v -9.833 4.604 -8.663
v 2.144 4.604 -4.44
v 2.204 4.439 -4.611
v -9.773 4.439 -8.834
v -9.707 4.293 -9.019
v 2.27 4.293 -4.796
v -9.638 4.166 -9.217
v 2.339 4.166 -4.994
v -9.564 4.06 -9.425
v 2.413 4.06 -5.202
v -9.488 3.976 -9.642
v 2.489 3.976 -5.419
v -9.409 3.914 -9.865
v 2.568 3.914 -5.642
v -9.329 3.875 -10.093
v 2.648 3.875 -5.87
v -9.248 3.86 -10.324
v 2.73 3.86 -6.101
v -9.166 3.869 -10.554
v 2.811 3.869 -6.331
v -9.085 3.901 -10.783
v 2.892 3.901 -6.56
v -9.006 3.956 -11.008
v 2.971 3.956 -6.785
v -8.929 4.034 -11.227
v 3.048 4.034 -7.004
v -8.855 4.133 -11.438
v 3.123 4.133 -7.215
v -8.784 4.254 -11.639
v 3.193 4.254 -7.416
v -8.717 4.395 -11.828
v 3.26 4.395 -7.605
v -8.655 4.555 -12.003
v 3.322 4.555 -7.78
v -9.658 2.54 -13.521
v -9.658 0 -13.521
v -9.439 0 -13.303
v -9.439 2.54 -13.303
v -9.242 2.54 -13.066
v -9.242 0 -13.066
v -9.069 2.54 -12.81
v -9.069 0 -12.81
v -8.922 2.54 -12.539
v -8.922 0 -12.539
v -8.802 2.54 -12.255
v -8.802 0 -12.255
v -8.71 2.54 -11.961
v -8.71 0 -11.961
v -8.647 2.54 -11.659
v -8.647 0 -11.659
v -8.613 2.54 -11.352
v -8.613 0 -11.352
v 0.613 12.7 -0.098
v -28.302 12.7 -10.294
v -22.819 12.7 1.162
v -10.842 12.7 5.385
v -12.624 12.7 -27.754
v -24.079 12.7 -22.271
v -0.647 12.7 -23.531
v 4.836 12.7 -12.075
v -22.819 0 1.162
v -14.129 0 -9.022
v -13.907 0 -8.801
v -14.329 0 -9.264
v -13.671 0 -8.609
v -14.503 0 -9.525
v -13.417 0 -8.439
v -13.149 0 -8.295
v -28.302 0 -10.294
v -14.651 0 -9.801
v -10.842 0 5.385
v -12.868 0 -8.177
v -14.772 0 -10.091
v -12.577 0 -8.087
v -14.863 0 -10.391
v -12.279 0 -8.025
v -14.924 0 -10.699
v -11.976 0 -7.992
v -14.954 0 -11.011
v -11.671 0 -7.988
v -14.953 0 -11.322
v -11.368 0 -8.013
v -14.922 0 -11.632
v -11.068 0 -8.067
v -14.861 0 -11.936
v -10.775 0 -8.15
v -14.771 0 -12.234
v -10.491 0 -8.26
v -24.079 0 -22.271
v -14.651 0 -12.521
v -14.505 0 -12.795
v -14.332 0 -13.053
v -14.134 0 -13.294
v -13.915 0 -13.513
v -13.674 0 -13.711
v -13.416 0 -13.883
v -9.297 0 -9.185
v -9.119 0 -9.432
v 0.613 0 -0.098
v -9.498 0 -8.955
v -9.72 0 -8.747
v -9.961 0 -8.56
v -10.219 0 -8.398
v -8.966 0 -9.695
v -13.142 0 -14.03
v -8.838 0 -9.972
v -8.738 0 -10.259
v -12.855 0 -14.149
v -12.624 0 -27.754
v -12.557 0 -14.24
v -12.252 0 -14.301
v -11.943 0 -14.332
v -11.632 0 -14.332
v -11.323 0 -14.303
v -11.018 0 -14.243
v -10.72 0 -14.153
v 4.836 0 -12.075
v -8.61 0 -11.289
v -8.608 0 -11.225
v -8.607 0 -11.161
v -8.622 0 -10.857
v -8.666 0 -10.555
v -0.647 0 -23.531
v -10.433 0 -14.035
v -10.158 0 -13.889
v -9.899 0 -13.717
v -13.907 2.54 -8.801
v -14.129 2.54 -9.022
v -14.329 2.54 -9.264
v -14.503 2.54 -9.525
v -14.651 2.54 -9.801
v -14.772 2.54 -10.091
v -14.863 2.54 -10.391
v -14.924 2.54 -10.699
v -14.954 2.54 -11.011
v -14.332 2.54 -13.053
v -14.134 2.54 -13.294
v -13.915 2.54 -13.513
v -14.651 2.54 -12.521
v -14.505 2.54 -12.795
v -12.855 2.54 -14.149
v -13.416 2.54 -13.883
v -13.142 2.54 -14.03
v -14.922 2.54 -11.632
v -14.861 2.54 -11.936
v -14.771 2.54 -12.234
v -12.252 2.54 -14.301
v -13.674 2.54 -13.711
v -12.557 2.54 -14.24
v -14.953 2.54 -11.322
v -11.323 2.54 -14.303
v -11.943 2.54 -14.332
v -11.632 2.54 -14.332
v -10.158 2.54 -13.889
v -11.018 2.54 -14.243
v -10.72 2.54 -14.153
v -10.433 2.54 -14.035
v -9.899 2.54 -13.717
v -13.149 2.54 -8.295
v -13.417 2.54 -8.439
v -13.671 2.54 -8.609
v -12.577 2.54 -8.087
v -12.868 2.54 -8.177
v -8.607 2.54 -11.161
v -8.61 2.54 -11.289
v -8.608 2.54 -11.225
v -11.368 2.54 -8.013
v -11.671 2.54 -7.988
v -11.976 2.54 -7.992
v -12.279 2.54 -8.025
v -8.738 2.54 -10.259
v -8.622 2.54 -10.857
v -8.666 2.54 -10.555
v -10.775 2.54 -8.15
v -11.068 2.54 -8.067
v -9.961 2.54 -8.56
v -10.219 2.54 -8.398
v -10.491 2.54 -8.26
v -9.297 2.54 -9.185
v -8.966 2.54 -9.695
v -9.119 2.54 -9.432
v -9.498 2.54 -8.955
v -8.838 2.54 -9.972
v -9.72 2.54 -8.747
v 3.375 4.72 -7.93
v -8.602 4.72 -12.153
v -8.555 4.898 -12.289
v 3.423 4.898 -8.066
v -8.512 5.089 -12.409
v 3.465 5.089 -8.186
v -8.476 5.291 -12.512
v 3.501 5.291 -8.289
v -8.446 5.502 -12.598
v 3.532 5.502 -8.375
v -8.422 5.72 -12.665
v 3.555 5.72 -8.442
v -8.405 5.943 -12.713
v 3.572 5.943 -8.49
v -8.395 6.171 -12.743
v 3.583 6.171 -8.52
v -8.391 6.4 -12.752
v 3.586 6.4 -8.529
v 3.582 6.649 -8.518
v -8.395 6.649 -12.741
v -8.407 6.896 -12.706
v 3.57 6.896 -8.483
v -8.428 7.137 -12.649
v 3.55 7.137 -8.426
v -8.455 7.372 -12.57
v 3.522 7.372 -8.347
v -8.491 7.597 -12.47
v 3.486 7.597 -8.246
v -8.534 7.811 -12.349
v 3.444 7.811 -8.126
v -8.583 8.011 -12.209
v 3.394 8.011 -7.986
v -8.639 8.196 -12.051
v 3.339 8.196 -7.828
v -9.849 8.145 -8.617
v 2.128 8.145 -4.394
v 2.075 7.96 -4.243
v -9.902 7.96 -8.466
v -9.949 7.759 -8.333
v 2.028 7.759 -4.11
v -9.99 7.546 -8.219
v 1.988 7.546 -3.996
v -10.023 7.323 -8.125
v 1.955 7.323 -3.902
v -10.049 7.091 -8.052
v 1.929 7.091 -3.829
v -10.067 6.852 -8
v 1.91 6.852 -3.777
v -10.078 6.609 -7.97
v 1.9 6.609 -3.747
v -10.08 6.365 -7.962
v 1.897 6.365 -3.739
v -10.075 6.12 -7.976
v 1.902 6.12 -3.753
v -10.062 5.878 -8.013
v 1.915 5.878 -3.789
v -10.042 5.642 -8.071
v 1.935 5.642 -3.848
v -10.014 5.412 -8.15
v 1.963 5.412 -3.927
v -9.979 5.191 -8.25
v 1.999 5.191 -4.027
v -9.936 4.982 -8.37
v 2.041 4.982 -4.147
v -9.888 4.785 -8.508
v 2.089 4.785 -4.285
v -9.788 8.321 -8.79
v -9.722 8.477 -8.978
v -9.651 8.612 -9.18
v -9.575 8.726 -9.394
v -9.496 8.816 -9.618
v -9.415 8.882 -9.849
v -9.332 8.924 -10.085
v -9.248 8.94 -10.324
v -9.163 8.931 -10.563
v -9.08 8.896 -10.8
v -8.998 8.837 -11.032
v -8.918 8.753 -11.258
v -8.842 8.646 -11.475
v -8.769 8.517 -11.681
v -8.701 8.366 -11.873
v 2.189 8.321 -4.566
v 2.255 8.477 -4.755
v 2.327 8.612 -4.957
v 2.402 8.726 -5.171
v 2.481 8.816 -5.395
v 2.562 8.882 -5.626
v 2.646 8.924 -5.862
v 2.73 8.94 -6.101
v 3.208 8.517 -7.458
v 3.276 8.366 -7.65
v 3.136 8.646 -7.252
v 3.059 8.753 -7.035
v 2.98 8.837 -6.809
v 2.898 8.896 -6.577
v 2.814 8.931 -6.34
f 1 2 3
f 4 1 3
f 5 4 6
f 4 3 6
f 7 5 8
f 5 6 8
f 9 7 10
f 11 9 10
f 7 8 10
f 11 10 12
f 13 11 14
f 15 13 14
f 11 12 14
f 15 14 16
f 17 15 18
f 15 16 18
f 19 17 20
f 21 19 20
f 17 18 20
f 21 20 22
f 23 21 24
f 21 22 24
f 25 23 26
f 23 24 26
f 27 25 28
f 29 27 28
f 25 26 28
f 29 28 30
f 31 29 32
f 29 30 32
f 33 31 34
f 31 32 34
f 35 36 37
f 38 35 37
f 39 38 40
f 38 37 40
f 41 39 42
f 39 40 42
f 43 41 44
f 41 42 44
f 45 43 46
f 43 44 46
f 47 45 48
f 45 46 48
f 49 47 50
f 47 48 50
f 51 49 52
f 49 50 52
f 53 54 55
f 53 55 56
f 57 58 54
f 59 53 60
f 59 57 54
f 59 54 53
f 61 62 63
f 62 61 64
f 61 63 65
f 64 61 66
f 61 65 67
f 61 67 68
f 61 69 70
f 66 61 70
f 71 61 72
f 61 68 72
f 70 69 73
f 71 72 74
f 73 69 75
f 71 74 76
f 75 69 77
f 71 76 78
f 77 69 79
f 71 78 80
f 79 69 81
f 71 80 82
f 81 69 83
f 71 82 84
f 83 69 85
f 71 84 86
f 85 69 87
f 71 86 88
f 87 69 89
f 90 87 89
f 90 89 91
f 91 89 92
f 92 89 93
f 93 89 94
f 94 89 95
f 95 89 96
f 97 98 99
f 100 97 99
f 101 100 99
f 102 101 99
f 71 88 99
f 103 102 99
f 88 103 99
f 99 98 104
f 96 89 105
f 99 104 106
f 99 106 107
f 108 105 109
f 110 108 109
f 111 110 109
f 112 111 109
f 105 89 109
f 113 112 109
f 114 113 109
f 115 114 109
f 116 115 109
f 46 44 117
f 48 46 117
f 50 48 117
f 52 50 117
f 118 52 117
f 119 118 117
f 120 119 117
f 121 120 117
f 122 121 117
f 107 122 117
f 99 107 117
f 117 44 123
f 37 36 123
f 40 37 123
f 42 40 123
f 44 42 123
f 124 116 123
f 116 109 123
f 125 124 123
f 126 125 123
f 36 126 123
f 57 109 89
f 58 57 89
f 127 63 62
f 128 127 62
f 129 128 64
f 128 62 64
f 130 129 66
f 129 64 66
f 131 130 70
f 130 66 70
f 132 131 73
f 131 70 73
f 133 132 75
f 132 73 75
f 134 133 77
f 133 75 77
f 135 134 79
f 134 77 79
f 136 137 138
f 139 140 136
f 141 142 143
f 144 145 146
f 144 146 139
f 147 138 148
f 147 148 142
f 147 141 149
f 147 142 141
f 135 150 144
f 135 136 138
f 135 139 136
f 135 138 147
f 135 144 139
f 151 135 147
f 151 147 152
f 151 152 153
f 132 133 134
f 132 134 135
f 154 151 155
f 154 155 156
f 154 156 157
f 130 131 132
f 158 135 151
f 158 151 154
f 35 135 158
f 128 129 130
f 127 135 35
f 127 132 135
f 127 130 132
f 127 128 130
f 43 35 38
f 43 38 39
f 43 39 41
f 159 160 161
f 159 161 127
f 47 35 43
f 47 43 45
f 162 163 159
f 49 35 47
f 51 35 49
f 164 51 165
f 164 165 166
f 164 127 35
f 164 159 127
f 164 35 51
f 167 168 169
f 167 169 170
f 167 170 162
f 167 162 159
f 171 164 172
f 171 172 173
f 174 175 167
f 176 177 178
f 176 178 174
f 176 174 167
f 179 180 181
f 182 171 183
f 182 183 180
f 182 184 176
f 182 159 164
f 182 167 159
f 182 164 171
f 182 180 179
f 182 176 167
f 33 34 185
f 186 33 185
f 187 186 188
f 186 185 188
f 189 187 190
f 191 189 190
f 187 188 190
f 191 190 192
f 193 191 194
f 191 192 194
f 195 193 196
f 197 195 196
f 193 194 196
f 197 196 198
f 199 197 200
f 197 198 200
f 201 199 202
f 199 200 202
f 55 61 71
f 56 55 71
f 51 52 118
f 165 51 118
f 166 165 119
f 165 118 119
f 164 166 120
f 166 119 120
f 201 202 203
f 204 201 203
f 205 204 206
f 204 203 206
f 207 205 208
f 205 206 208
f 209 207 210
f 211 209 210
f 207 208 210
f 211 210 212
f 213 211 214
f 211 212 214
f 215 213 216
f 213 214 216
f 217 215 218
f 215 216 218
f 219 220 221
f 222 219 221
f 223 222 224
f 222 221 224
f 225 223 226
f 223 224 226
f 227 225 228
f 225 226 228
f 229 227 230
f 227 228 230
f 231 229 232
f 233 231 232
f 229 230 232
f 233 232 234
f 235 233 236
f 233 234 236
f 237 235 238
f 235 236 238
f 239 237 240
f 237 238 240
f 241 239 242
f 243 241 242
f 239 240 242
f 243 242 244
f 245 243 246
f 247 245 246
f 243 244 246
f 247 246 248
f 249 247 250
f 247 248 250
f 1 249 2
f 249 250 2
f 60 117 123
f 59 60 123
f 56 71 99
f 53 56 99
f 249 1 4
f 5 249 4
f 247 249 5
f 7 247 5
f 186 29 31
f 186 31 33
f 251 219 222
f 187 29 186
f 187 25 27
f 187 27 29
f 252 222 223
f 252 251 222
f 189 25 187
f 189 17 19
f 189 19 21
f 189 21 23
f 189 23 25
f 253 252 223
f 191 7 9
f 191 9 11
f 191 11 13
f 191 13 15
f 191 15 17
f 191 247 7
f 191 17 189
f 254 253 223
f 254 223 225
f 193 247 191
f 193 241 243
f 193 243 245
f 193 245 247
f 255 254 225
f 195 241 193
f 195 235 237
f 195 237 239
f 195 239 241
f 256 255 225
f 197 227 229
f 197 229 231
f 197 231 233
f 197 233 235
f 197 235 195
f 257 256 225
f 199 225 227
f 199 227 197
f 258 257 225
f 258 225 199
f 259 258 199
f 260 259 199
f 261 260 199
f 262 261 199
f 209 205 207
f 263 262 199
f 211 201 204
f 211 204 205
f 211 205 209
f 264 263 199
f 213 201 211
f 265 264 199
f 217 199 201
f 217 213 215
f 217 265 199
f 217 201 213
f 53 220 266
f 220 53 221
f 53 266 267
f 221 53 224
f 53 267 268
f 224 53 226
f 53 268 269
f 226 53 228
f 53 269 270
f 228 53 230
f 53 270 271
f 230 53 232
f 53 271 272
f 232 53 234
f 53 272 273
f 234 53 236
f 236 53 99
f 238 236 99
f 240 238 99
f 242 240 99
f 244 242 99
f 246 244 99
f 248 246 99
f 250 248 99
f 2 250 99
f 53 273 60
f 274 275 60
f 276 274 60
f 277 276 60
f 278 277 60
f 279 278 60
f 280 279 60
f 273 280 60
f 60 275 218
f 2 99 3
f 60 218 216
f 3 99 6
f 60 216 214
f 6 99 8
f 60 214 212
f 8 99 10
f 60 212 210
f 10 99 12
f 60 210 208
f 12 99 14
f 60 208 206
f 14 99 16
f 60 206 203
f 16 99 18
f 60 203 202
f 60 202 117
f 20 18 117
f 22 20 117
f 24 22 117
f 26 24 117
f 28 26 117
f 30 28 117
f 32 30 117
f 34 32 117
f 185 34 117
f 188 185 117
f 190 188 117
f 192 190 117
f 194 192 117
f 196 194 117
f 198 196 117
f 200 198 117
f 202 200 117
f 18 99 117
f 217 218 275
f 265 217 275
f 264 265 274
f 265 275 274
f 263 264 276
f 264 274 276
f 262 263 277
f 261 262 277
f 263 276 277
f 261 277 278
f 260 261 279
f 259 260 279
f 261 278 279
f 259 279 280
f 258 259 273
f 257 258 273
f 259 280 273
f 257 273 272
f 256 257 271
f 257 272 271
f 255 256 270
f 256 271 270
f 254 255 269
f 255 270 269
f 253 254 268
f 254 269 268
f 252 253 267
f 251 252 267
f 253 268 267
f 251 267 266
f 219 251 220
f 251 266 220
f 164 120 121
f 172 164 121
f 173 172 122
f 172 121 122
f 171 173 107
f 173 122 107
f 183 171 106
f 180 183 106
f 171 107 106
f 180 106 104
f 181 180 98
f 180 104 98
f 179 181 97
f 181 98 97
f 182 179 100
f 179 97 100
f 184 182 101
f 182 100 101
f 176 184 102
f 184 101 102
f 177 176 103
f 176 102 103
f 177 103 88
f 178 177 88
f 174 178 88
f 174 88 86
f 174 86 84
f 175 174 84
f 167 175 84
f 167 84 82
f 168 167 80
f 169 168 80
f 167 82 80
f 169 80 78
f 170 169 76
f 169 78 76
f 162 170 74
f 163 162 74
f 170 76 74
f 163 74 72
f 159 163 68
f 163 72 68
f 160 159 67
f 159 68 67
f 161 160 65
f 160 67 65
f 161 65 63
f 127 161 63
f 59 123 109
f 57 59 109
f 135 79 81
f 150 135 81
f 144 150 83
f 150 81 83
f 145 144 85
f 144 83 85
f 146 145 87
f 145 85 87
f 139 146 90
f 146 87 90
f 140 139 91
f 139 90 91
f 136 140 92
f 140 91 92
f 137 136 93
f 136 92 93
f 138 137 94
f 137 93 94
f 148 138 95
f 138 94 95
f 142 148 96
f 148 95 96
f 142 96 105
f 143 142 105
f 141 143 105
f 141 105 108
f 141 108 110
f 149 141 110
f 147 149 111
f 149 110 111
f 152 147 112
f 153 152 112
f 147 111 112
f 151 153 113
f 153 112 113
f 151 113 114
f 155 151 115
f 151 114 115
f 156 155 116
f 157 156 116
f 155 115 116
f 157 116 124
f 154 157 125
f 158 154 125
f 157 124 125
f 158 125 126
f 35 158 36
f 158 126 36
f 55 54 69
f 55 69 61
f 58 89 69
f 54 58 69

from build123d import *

# Parameters (mm, degrees)
BOSS_EXTRUDE1_DEPTH = 12.7
CUT_EXTRUDE1_DEPTH  = 12.7
CUT_EXTRUDE2_DEPTH  = 2.54


with BuildPart() as part:
    # Sketch1 → Boss-Extrude1 (new body)
    with BuildSketch(Plane(origin=(0, 0, 0), x_dir=(1, 0, 0), z_dir=(0, 1, 0))):
        Polygon((-10.842199515, -5.384904617), (0.613239188, 0.098062109), (4.836414625, 12.07532345), (-0.6465521, 23.530762153), (-12.623813441, 27.75393759), (-24.079252145, 22.270970865), (-28.302427581, 10.293709523), (-22.819460856, -1.16172918), align=None)
    extrude(amount=BOSS_EXTRUDE1_DEPTH)

    # Sketch2 → Cut-Extrude1 (cut)
    with BuildSketch(Plane(origin=(0.514674893, 0, 0.18147407), x_dir=(0.33253349893190465, 0, -0.9430914441813716), z_dir=(0.9430914441813716, 0, 0.33253349893190465))):
        with BuildLine():
            ThreePointArc((9.236420315, 6.400016207), (9.043074328, 7.372032125), (8.49247154, 8.196067431))
            Line((8.49247154, 8.196067431), (6.646404109, 6.35))
            Line((6.646404109, 6.35), (8.441758775, 4.554645333))
            ThreePointArc((8.441758775, 4.554645333), (9.029311192, 5.395416707), (9.236420315, 6.400016207))
        make_face()
        with BuildLine():
            Line((6.646404109, 6.35), (8.49247154, 8.196067431))
            ThreePointArc((8.49247154, 8.196067431), (6.661050087, 8.939769925), (4.851049442, 8.145354667))
            Line((4.851049442, 8.145354667), (6.646404109, 6.35))
        make_face()
        with BuildLine():
            Line((8.441758775, 4.554645333), (6.646404109, 6.35))
            Line((6.646404109, 6.35), (4.900369091, 4.603964983))
            ThreePointArc((4.900369091, 4.603964983), (6.661050087, 3.860262489), (8.441758775, 4.554645333))
        make_face()
        with BuildLine():
            Line((4.900369091, 4.603964983), (6.646404109, 6.35))
            Line((6.646404109, 6.35), (4.851049442, 8.145354667))
            ThreePointArc((4.851049442, 8.145354667), (4.156666598, 6.364645978), (4.900369091, 4.603964983))
        make_face()
    extrude(amount=-CUT_EXTRUDE1_DEPTH, mode=Mode.SUBTRACT)

    # Sketch3 → Cut-Extrude2 (cut)
    with BuildSketch(Plane.XZ):
        with BuildLine():
            ThreePointArc((-14.953750816, -11.01136249), (-13.141781341, -14.030145133), (-9.65800947, -13.520620278))
            Line((-9.65800947, -13.520620278), (-11.762472687, -11.182932321))
            Line((-11.762472687, -11.182932321), (-14.953750816, -11.01136249))
        make_face()
        with BuildLine():
            Line((-11.762472687, -11.182932321), (-9.65800947, -13.520620278))
            ThreePointArc((-9.65800947, -13.520620278), (-8.922077868, -12.53930026), (-8.613045297, -11.352252168))
            Line((-8.613045297, -11.352252168), (-11.762472687, -11.182932321))
        make_face()
        with BuildLine():
            Line((-14.953750816, -11.01136249), (-11.762472687, -11.182932321))
            Line((-11.762472687, -11.182932321), (-13.906542304, -8.80124863))
            ThreePointArc((-13.906542304, -8.80124863), (-14.651486566, -9.801429), (-14.953750816, -11.01136249))
        make_face()
        with BuildLine():
            Line((-13.906542304, -8.80124863), (-11.762472687, -11.182932321))
            Line((-11.762472687, -11.182932321), (-8.613045297, -11.352252168))
            ThreePointArc((-8.613045297, -11.352252168), (-8.608718567, -11.256636797), (-8.607275887, -11.160934454))
            ThreePointArc((-8.607275887, -11.160934454), (-10.490749827, -8.260488723), (-13.906542304, -8.80124863))
        make_face()
    extrude(amount=-CUT_EXTRUDE2_DEPTH, mode=Mode.SUBTRACT)


solid = part.part
